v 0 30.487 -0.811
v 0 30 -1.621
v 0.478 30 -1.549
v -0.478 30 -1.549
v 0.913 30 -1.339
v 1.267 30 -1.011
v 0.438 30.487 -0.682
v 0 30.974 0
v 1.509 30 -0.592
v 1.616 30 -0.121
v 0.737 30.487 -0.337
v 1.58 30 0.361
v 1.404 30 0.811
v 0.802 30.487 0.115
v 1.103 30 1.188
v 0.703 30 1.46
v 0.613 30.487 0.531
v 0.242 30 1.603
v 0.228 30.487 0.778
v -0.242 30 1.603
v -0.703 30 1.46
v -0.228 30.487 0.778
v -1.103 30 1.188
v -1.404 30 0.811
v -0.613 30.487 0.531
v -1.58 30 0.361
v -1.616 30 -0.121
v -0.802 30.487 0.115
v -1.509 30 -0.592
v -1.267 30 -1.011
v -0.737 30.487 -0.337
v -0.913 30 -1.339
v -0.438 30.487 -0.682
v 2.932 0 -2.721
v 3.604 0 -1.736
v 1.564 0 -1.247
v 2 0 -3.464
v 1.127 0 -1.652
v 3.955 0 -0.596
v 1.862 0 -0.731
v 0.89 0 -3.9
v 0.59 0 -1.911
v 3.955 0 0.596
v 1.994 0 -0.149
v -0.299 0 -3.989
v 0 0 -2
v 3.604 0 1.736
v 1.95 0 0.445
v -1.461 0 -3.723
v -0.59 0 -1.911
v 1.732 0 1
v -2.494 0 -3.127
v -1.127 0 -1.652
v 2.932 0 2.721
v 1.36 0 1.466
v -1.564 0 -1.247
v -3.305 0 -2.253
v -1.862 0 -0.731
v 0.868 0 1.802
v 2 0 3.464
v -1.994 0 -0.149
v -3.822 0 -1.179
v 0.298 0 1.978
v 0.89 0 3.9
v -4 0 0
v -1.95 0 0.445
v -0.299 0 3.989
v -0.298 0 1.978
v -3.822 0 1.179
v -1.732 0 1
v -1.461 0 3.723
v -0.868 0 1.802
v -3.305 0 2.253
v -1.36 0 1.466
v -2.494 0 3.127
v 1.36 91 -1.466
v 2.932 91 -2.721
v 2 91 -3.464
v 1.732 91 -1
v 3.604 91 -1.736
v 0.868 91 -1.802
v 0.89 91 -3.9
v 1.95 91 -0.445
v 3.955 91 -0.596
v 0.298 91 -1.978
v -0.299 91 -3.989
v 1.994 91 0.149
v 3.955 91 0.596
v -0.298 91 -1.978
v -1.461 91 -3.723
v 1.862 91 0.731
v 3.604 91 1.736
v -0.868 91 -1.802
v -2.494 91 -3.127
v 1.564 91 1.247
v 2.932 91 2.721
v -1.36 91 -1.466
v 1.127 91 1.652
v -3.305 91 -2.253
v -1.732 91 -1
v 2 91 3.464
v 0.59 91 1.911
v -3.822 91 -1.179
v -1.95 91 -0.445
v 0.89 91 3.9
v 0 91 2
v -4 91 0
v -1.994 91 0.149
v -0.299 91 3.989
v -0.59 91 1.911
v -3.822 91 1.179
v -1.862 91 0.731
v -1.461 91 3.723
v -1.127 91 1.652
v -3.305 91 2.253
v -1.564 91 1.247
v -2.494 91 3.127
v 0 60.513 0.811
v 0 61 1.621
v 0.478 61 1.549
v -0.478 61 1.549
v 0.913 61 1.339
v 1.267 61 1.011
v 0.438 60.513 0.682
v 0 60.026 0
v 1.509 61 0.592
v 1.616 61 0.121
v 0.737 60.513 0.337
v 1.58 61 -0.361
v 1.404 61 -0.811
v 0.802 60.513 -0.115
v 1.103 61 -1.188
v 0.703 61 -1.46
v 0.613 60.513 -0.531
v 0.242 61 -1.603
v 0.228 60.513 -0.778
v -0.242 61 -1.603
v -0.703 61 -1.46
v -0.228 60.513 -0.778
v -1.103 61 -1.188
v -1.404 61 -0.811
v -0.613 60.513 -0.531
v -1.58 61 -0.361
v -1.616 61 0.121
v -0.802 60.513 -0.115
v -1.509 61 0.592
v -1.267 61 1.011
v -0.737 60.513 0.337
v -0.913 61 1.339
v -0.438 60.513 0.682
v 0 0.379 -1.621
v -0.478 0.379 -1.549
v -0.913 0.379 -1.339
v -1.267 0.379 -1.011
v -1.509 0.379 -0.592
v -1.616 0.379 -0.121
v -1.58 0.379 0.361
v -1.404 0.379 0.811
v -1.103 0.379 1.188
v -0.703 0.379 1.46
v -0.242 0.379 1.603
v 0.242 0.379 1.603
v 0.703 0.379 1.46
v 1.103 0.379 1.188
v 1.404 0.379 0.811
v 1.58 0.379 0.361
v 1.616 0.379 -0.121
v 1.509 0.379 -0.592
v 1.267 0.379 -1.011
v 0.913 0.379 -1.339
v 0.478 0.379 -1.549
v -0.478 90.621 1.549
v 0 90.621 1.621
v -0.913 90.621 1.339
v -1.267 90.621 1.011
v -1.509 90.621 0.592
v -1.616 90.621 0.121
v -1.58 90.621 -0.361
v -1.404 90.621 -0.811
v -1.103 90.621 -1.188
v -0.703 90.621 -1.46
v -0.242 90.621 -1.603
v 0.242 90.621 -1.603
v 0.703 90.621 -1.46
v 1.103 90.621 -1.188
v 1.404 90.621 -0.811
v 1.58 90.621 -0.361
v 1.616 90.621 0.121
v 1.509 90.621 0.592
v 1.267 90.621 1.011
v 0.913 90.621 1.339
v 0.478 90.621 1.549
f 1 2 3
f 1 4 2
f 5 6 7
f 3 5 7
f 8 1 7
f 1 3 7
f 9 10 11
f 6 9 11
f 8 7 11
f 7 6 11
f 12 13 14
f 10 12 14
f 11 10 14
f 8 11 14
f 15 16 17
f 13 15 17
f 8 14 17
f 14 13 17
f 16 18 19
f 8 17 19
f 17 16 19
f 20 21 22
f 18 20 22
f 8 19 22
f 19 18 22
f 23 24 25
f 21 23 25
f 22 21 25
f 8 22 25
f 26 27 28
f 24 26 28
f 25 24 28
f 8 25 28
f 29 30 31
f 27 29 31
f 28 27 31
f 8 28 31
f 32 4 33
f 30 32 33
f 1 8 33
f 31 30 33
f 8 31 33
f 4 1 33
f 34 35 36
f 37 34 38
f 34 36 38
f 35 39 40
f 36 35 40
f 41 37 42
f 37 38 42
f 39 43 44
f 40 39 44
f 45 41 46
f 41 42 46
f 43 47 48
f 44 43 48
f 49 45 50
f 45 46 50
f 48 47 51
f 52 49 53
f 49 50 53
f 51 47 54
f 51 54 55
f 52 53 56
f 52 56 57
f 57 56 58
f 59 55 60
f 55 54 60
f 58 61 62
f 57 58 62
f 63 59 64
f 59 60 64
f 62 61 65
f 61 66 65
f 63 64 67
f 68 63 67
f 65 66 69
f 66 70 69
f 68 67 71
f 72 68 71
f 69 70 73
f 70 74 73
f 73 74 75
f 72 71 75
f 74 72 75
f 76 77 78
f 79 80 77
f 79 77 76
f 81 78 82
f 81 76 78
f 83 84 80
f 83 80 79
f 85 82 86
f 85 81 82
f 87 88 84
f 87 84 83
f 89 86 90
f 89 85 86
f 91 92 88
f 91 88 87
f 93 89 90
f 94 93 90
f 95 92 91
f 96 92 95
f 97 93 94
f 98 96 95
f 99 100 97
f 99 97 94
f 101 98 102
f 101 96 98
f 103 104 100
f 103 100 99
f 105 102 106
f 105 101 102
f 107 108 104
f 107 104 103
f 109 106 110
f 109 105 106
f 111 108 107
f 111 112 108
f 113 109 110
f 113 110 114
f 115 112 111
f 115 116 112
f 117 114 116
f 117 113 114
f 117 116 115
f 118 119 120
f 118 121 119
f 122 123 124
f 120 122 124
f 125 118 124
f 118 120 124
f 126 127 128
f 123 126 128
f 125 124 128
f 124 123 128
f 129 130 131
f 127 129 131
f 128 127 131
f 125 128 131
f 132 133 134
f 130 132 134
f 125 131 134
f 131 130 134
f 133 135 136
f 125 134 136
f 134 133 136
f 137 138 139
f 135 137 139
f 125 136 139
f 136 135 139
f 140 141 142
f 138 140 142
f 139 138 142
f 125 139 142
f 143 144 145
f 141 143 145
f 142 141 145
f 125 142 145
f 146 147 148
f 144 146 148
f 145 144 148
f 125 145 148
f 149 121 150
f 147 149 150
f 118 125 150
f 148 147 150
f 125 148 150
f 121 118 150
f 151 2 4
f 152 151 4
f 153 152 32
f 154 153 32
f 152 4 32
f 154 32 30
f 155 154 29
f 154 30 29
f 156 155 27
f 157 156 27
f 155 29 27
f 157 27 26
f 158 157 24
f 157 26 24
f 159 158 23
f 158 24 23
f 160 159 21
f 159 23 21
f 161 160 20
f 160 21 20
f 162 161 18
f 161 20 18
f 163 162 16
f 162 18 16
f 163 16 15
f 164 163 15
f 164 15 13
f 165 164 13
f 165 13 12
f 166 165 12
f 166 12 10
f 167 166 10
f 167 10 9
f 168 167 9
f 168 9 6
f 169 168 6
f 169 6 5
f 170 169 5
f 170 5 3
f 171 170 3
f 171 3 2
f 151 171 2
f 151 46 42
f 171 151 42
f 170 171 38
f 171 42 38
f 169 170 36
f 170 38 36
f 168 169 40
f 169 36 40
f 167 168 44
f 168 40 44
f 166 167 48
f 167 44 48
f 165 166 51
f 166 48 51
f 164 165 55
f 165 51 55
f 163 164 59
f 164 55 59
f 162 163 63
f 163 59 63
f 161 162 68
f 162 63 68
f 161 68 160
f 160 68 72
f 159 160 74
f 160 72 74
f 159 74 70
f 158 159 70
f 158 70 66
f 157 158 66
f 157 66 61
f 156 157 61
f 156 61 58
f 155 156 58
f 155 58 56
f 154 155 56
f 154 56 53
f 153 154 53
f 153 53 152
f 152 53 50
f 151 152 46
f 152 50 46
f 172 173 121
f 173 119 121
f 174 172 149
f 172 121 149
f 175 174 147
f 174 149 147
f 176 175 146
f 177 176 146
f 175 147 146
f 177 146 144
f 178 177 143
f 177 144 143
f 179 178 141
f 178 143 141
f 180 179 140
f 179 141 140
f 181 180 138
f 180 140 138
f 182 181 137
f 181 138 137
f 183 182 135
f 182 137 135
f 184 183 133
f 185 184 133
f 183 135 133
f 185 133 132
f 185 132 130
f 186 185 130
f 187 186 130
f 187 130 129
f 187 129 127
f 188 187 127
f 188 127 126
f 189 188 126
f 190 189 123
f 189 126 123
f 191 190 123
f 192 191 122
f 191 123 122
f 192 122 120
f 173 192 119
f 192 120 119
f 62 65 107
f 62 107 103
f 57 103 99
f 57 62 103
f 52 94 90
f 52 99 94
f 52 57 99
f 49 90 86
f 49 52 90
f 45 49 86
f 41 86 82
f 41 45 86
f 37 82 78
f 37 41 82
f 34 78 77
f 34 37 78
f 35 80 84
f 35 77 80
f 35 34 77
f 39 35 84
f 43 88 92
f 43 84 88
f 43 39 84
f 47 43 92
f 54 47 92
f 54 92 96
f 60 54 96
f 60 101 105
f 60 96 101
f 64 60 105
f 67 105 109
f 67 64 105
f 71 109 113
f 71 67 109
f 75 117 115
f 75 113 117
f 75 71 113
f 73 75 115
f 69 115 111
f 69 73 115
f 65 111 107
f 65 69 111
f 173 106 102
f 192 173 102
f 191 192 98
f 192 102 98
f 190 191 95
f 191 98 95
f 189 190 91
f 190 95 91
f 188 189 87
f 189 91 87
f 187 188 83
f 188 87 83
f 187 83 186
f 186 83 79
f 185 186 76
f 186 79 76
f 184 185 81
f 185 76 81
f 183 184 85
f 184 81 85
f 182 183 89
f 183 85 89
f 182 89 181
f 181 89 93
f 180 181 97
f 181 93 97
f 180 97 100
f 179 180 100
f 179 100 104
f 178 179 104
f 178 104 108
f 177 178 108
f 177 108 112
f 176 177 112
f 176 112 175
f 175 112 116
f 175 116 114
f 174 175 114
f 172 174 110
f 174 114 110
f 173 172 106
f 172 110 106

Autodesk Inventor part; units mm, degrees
ref_plane "YZ Plane" through (0, 0, 0) normal (1, 0, 0) x (0, 1, 0)
ref_plane "XZ Plane" through (0, 0, 0) normal (0, 1, 0) x (-1, 0, 0)
ref_plane "XY Plane" through (0, 0, 0) normal (0, 0, 1) x (1, 0, 0)
sketch "スケッチ1" plane through (0, 0, 0) normal (0, 1, 0) x (-1, 0, 0)
  circle A0 centre (0, 0) radius 4
  dimension "d0" = 8
extrude "押し出し1" add sketch "スケッチ1" along normal blind 91
sketch "スケッチ2" plane through (0, 0, 0) normal (0, -1, 0) x (1, 0, 0)
  point P0 (0, 0)
sketch "スケッチ3" plane through (0, 91, 0) normal (0, 1, 0) x (1, 0, 0)
  point P0 (0, 0)
hole "穴1" at (0, 91, 0) direction (0, -1, 0) diameter 3.242 depth 30 tip angle 118 countersink diameter 4 countersink angle 90 thread size "M4x0.7" class "6H" standard "ISO Metric profile"
hole "穴2" at (0, 0, 0) direction (0, 1, 0) diameter 3.242 depth 30 tip angle 118 countersink diameter 4 countersink angle 90 thread size "M4x0.7" class "6H" standard "ISO Metric profile"
properties part number "p8ALshaft" material "アルミニウム 2014-T4"
